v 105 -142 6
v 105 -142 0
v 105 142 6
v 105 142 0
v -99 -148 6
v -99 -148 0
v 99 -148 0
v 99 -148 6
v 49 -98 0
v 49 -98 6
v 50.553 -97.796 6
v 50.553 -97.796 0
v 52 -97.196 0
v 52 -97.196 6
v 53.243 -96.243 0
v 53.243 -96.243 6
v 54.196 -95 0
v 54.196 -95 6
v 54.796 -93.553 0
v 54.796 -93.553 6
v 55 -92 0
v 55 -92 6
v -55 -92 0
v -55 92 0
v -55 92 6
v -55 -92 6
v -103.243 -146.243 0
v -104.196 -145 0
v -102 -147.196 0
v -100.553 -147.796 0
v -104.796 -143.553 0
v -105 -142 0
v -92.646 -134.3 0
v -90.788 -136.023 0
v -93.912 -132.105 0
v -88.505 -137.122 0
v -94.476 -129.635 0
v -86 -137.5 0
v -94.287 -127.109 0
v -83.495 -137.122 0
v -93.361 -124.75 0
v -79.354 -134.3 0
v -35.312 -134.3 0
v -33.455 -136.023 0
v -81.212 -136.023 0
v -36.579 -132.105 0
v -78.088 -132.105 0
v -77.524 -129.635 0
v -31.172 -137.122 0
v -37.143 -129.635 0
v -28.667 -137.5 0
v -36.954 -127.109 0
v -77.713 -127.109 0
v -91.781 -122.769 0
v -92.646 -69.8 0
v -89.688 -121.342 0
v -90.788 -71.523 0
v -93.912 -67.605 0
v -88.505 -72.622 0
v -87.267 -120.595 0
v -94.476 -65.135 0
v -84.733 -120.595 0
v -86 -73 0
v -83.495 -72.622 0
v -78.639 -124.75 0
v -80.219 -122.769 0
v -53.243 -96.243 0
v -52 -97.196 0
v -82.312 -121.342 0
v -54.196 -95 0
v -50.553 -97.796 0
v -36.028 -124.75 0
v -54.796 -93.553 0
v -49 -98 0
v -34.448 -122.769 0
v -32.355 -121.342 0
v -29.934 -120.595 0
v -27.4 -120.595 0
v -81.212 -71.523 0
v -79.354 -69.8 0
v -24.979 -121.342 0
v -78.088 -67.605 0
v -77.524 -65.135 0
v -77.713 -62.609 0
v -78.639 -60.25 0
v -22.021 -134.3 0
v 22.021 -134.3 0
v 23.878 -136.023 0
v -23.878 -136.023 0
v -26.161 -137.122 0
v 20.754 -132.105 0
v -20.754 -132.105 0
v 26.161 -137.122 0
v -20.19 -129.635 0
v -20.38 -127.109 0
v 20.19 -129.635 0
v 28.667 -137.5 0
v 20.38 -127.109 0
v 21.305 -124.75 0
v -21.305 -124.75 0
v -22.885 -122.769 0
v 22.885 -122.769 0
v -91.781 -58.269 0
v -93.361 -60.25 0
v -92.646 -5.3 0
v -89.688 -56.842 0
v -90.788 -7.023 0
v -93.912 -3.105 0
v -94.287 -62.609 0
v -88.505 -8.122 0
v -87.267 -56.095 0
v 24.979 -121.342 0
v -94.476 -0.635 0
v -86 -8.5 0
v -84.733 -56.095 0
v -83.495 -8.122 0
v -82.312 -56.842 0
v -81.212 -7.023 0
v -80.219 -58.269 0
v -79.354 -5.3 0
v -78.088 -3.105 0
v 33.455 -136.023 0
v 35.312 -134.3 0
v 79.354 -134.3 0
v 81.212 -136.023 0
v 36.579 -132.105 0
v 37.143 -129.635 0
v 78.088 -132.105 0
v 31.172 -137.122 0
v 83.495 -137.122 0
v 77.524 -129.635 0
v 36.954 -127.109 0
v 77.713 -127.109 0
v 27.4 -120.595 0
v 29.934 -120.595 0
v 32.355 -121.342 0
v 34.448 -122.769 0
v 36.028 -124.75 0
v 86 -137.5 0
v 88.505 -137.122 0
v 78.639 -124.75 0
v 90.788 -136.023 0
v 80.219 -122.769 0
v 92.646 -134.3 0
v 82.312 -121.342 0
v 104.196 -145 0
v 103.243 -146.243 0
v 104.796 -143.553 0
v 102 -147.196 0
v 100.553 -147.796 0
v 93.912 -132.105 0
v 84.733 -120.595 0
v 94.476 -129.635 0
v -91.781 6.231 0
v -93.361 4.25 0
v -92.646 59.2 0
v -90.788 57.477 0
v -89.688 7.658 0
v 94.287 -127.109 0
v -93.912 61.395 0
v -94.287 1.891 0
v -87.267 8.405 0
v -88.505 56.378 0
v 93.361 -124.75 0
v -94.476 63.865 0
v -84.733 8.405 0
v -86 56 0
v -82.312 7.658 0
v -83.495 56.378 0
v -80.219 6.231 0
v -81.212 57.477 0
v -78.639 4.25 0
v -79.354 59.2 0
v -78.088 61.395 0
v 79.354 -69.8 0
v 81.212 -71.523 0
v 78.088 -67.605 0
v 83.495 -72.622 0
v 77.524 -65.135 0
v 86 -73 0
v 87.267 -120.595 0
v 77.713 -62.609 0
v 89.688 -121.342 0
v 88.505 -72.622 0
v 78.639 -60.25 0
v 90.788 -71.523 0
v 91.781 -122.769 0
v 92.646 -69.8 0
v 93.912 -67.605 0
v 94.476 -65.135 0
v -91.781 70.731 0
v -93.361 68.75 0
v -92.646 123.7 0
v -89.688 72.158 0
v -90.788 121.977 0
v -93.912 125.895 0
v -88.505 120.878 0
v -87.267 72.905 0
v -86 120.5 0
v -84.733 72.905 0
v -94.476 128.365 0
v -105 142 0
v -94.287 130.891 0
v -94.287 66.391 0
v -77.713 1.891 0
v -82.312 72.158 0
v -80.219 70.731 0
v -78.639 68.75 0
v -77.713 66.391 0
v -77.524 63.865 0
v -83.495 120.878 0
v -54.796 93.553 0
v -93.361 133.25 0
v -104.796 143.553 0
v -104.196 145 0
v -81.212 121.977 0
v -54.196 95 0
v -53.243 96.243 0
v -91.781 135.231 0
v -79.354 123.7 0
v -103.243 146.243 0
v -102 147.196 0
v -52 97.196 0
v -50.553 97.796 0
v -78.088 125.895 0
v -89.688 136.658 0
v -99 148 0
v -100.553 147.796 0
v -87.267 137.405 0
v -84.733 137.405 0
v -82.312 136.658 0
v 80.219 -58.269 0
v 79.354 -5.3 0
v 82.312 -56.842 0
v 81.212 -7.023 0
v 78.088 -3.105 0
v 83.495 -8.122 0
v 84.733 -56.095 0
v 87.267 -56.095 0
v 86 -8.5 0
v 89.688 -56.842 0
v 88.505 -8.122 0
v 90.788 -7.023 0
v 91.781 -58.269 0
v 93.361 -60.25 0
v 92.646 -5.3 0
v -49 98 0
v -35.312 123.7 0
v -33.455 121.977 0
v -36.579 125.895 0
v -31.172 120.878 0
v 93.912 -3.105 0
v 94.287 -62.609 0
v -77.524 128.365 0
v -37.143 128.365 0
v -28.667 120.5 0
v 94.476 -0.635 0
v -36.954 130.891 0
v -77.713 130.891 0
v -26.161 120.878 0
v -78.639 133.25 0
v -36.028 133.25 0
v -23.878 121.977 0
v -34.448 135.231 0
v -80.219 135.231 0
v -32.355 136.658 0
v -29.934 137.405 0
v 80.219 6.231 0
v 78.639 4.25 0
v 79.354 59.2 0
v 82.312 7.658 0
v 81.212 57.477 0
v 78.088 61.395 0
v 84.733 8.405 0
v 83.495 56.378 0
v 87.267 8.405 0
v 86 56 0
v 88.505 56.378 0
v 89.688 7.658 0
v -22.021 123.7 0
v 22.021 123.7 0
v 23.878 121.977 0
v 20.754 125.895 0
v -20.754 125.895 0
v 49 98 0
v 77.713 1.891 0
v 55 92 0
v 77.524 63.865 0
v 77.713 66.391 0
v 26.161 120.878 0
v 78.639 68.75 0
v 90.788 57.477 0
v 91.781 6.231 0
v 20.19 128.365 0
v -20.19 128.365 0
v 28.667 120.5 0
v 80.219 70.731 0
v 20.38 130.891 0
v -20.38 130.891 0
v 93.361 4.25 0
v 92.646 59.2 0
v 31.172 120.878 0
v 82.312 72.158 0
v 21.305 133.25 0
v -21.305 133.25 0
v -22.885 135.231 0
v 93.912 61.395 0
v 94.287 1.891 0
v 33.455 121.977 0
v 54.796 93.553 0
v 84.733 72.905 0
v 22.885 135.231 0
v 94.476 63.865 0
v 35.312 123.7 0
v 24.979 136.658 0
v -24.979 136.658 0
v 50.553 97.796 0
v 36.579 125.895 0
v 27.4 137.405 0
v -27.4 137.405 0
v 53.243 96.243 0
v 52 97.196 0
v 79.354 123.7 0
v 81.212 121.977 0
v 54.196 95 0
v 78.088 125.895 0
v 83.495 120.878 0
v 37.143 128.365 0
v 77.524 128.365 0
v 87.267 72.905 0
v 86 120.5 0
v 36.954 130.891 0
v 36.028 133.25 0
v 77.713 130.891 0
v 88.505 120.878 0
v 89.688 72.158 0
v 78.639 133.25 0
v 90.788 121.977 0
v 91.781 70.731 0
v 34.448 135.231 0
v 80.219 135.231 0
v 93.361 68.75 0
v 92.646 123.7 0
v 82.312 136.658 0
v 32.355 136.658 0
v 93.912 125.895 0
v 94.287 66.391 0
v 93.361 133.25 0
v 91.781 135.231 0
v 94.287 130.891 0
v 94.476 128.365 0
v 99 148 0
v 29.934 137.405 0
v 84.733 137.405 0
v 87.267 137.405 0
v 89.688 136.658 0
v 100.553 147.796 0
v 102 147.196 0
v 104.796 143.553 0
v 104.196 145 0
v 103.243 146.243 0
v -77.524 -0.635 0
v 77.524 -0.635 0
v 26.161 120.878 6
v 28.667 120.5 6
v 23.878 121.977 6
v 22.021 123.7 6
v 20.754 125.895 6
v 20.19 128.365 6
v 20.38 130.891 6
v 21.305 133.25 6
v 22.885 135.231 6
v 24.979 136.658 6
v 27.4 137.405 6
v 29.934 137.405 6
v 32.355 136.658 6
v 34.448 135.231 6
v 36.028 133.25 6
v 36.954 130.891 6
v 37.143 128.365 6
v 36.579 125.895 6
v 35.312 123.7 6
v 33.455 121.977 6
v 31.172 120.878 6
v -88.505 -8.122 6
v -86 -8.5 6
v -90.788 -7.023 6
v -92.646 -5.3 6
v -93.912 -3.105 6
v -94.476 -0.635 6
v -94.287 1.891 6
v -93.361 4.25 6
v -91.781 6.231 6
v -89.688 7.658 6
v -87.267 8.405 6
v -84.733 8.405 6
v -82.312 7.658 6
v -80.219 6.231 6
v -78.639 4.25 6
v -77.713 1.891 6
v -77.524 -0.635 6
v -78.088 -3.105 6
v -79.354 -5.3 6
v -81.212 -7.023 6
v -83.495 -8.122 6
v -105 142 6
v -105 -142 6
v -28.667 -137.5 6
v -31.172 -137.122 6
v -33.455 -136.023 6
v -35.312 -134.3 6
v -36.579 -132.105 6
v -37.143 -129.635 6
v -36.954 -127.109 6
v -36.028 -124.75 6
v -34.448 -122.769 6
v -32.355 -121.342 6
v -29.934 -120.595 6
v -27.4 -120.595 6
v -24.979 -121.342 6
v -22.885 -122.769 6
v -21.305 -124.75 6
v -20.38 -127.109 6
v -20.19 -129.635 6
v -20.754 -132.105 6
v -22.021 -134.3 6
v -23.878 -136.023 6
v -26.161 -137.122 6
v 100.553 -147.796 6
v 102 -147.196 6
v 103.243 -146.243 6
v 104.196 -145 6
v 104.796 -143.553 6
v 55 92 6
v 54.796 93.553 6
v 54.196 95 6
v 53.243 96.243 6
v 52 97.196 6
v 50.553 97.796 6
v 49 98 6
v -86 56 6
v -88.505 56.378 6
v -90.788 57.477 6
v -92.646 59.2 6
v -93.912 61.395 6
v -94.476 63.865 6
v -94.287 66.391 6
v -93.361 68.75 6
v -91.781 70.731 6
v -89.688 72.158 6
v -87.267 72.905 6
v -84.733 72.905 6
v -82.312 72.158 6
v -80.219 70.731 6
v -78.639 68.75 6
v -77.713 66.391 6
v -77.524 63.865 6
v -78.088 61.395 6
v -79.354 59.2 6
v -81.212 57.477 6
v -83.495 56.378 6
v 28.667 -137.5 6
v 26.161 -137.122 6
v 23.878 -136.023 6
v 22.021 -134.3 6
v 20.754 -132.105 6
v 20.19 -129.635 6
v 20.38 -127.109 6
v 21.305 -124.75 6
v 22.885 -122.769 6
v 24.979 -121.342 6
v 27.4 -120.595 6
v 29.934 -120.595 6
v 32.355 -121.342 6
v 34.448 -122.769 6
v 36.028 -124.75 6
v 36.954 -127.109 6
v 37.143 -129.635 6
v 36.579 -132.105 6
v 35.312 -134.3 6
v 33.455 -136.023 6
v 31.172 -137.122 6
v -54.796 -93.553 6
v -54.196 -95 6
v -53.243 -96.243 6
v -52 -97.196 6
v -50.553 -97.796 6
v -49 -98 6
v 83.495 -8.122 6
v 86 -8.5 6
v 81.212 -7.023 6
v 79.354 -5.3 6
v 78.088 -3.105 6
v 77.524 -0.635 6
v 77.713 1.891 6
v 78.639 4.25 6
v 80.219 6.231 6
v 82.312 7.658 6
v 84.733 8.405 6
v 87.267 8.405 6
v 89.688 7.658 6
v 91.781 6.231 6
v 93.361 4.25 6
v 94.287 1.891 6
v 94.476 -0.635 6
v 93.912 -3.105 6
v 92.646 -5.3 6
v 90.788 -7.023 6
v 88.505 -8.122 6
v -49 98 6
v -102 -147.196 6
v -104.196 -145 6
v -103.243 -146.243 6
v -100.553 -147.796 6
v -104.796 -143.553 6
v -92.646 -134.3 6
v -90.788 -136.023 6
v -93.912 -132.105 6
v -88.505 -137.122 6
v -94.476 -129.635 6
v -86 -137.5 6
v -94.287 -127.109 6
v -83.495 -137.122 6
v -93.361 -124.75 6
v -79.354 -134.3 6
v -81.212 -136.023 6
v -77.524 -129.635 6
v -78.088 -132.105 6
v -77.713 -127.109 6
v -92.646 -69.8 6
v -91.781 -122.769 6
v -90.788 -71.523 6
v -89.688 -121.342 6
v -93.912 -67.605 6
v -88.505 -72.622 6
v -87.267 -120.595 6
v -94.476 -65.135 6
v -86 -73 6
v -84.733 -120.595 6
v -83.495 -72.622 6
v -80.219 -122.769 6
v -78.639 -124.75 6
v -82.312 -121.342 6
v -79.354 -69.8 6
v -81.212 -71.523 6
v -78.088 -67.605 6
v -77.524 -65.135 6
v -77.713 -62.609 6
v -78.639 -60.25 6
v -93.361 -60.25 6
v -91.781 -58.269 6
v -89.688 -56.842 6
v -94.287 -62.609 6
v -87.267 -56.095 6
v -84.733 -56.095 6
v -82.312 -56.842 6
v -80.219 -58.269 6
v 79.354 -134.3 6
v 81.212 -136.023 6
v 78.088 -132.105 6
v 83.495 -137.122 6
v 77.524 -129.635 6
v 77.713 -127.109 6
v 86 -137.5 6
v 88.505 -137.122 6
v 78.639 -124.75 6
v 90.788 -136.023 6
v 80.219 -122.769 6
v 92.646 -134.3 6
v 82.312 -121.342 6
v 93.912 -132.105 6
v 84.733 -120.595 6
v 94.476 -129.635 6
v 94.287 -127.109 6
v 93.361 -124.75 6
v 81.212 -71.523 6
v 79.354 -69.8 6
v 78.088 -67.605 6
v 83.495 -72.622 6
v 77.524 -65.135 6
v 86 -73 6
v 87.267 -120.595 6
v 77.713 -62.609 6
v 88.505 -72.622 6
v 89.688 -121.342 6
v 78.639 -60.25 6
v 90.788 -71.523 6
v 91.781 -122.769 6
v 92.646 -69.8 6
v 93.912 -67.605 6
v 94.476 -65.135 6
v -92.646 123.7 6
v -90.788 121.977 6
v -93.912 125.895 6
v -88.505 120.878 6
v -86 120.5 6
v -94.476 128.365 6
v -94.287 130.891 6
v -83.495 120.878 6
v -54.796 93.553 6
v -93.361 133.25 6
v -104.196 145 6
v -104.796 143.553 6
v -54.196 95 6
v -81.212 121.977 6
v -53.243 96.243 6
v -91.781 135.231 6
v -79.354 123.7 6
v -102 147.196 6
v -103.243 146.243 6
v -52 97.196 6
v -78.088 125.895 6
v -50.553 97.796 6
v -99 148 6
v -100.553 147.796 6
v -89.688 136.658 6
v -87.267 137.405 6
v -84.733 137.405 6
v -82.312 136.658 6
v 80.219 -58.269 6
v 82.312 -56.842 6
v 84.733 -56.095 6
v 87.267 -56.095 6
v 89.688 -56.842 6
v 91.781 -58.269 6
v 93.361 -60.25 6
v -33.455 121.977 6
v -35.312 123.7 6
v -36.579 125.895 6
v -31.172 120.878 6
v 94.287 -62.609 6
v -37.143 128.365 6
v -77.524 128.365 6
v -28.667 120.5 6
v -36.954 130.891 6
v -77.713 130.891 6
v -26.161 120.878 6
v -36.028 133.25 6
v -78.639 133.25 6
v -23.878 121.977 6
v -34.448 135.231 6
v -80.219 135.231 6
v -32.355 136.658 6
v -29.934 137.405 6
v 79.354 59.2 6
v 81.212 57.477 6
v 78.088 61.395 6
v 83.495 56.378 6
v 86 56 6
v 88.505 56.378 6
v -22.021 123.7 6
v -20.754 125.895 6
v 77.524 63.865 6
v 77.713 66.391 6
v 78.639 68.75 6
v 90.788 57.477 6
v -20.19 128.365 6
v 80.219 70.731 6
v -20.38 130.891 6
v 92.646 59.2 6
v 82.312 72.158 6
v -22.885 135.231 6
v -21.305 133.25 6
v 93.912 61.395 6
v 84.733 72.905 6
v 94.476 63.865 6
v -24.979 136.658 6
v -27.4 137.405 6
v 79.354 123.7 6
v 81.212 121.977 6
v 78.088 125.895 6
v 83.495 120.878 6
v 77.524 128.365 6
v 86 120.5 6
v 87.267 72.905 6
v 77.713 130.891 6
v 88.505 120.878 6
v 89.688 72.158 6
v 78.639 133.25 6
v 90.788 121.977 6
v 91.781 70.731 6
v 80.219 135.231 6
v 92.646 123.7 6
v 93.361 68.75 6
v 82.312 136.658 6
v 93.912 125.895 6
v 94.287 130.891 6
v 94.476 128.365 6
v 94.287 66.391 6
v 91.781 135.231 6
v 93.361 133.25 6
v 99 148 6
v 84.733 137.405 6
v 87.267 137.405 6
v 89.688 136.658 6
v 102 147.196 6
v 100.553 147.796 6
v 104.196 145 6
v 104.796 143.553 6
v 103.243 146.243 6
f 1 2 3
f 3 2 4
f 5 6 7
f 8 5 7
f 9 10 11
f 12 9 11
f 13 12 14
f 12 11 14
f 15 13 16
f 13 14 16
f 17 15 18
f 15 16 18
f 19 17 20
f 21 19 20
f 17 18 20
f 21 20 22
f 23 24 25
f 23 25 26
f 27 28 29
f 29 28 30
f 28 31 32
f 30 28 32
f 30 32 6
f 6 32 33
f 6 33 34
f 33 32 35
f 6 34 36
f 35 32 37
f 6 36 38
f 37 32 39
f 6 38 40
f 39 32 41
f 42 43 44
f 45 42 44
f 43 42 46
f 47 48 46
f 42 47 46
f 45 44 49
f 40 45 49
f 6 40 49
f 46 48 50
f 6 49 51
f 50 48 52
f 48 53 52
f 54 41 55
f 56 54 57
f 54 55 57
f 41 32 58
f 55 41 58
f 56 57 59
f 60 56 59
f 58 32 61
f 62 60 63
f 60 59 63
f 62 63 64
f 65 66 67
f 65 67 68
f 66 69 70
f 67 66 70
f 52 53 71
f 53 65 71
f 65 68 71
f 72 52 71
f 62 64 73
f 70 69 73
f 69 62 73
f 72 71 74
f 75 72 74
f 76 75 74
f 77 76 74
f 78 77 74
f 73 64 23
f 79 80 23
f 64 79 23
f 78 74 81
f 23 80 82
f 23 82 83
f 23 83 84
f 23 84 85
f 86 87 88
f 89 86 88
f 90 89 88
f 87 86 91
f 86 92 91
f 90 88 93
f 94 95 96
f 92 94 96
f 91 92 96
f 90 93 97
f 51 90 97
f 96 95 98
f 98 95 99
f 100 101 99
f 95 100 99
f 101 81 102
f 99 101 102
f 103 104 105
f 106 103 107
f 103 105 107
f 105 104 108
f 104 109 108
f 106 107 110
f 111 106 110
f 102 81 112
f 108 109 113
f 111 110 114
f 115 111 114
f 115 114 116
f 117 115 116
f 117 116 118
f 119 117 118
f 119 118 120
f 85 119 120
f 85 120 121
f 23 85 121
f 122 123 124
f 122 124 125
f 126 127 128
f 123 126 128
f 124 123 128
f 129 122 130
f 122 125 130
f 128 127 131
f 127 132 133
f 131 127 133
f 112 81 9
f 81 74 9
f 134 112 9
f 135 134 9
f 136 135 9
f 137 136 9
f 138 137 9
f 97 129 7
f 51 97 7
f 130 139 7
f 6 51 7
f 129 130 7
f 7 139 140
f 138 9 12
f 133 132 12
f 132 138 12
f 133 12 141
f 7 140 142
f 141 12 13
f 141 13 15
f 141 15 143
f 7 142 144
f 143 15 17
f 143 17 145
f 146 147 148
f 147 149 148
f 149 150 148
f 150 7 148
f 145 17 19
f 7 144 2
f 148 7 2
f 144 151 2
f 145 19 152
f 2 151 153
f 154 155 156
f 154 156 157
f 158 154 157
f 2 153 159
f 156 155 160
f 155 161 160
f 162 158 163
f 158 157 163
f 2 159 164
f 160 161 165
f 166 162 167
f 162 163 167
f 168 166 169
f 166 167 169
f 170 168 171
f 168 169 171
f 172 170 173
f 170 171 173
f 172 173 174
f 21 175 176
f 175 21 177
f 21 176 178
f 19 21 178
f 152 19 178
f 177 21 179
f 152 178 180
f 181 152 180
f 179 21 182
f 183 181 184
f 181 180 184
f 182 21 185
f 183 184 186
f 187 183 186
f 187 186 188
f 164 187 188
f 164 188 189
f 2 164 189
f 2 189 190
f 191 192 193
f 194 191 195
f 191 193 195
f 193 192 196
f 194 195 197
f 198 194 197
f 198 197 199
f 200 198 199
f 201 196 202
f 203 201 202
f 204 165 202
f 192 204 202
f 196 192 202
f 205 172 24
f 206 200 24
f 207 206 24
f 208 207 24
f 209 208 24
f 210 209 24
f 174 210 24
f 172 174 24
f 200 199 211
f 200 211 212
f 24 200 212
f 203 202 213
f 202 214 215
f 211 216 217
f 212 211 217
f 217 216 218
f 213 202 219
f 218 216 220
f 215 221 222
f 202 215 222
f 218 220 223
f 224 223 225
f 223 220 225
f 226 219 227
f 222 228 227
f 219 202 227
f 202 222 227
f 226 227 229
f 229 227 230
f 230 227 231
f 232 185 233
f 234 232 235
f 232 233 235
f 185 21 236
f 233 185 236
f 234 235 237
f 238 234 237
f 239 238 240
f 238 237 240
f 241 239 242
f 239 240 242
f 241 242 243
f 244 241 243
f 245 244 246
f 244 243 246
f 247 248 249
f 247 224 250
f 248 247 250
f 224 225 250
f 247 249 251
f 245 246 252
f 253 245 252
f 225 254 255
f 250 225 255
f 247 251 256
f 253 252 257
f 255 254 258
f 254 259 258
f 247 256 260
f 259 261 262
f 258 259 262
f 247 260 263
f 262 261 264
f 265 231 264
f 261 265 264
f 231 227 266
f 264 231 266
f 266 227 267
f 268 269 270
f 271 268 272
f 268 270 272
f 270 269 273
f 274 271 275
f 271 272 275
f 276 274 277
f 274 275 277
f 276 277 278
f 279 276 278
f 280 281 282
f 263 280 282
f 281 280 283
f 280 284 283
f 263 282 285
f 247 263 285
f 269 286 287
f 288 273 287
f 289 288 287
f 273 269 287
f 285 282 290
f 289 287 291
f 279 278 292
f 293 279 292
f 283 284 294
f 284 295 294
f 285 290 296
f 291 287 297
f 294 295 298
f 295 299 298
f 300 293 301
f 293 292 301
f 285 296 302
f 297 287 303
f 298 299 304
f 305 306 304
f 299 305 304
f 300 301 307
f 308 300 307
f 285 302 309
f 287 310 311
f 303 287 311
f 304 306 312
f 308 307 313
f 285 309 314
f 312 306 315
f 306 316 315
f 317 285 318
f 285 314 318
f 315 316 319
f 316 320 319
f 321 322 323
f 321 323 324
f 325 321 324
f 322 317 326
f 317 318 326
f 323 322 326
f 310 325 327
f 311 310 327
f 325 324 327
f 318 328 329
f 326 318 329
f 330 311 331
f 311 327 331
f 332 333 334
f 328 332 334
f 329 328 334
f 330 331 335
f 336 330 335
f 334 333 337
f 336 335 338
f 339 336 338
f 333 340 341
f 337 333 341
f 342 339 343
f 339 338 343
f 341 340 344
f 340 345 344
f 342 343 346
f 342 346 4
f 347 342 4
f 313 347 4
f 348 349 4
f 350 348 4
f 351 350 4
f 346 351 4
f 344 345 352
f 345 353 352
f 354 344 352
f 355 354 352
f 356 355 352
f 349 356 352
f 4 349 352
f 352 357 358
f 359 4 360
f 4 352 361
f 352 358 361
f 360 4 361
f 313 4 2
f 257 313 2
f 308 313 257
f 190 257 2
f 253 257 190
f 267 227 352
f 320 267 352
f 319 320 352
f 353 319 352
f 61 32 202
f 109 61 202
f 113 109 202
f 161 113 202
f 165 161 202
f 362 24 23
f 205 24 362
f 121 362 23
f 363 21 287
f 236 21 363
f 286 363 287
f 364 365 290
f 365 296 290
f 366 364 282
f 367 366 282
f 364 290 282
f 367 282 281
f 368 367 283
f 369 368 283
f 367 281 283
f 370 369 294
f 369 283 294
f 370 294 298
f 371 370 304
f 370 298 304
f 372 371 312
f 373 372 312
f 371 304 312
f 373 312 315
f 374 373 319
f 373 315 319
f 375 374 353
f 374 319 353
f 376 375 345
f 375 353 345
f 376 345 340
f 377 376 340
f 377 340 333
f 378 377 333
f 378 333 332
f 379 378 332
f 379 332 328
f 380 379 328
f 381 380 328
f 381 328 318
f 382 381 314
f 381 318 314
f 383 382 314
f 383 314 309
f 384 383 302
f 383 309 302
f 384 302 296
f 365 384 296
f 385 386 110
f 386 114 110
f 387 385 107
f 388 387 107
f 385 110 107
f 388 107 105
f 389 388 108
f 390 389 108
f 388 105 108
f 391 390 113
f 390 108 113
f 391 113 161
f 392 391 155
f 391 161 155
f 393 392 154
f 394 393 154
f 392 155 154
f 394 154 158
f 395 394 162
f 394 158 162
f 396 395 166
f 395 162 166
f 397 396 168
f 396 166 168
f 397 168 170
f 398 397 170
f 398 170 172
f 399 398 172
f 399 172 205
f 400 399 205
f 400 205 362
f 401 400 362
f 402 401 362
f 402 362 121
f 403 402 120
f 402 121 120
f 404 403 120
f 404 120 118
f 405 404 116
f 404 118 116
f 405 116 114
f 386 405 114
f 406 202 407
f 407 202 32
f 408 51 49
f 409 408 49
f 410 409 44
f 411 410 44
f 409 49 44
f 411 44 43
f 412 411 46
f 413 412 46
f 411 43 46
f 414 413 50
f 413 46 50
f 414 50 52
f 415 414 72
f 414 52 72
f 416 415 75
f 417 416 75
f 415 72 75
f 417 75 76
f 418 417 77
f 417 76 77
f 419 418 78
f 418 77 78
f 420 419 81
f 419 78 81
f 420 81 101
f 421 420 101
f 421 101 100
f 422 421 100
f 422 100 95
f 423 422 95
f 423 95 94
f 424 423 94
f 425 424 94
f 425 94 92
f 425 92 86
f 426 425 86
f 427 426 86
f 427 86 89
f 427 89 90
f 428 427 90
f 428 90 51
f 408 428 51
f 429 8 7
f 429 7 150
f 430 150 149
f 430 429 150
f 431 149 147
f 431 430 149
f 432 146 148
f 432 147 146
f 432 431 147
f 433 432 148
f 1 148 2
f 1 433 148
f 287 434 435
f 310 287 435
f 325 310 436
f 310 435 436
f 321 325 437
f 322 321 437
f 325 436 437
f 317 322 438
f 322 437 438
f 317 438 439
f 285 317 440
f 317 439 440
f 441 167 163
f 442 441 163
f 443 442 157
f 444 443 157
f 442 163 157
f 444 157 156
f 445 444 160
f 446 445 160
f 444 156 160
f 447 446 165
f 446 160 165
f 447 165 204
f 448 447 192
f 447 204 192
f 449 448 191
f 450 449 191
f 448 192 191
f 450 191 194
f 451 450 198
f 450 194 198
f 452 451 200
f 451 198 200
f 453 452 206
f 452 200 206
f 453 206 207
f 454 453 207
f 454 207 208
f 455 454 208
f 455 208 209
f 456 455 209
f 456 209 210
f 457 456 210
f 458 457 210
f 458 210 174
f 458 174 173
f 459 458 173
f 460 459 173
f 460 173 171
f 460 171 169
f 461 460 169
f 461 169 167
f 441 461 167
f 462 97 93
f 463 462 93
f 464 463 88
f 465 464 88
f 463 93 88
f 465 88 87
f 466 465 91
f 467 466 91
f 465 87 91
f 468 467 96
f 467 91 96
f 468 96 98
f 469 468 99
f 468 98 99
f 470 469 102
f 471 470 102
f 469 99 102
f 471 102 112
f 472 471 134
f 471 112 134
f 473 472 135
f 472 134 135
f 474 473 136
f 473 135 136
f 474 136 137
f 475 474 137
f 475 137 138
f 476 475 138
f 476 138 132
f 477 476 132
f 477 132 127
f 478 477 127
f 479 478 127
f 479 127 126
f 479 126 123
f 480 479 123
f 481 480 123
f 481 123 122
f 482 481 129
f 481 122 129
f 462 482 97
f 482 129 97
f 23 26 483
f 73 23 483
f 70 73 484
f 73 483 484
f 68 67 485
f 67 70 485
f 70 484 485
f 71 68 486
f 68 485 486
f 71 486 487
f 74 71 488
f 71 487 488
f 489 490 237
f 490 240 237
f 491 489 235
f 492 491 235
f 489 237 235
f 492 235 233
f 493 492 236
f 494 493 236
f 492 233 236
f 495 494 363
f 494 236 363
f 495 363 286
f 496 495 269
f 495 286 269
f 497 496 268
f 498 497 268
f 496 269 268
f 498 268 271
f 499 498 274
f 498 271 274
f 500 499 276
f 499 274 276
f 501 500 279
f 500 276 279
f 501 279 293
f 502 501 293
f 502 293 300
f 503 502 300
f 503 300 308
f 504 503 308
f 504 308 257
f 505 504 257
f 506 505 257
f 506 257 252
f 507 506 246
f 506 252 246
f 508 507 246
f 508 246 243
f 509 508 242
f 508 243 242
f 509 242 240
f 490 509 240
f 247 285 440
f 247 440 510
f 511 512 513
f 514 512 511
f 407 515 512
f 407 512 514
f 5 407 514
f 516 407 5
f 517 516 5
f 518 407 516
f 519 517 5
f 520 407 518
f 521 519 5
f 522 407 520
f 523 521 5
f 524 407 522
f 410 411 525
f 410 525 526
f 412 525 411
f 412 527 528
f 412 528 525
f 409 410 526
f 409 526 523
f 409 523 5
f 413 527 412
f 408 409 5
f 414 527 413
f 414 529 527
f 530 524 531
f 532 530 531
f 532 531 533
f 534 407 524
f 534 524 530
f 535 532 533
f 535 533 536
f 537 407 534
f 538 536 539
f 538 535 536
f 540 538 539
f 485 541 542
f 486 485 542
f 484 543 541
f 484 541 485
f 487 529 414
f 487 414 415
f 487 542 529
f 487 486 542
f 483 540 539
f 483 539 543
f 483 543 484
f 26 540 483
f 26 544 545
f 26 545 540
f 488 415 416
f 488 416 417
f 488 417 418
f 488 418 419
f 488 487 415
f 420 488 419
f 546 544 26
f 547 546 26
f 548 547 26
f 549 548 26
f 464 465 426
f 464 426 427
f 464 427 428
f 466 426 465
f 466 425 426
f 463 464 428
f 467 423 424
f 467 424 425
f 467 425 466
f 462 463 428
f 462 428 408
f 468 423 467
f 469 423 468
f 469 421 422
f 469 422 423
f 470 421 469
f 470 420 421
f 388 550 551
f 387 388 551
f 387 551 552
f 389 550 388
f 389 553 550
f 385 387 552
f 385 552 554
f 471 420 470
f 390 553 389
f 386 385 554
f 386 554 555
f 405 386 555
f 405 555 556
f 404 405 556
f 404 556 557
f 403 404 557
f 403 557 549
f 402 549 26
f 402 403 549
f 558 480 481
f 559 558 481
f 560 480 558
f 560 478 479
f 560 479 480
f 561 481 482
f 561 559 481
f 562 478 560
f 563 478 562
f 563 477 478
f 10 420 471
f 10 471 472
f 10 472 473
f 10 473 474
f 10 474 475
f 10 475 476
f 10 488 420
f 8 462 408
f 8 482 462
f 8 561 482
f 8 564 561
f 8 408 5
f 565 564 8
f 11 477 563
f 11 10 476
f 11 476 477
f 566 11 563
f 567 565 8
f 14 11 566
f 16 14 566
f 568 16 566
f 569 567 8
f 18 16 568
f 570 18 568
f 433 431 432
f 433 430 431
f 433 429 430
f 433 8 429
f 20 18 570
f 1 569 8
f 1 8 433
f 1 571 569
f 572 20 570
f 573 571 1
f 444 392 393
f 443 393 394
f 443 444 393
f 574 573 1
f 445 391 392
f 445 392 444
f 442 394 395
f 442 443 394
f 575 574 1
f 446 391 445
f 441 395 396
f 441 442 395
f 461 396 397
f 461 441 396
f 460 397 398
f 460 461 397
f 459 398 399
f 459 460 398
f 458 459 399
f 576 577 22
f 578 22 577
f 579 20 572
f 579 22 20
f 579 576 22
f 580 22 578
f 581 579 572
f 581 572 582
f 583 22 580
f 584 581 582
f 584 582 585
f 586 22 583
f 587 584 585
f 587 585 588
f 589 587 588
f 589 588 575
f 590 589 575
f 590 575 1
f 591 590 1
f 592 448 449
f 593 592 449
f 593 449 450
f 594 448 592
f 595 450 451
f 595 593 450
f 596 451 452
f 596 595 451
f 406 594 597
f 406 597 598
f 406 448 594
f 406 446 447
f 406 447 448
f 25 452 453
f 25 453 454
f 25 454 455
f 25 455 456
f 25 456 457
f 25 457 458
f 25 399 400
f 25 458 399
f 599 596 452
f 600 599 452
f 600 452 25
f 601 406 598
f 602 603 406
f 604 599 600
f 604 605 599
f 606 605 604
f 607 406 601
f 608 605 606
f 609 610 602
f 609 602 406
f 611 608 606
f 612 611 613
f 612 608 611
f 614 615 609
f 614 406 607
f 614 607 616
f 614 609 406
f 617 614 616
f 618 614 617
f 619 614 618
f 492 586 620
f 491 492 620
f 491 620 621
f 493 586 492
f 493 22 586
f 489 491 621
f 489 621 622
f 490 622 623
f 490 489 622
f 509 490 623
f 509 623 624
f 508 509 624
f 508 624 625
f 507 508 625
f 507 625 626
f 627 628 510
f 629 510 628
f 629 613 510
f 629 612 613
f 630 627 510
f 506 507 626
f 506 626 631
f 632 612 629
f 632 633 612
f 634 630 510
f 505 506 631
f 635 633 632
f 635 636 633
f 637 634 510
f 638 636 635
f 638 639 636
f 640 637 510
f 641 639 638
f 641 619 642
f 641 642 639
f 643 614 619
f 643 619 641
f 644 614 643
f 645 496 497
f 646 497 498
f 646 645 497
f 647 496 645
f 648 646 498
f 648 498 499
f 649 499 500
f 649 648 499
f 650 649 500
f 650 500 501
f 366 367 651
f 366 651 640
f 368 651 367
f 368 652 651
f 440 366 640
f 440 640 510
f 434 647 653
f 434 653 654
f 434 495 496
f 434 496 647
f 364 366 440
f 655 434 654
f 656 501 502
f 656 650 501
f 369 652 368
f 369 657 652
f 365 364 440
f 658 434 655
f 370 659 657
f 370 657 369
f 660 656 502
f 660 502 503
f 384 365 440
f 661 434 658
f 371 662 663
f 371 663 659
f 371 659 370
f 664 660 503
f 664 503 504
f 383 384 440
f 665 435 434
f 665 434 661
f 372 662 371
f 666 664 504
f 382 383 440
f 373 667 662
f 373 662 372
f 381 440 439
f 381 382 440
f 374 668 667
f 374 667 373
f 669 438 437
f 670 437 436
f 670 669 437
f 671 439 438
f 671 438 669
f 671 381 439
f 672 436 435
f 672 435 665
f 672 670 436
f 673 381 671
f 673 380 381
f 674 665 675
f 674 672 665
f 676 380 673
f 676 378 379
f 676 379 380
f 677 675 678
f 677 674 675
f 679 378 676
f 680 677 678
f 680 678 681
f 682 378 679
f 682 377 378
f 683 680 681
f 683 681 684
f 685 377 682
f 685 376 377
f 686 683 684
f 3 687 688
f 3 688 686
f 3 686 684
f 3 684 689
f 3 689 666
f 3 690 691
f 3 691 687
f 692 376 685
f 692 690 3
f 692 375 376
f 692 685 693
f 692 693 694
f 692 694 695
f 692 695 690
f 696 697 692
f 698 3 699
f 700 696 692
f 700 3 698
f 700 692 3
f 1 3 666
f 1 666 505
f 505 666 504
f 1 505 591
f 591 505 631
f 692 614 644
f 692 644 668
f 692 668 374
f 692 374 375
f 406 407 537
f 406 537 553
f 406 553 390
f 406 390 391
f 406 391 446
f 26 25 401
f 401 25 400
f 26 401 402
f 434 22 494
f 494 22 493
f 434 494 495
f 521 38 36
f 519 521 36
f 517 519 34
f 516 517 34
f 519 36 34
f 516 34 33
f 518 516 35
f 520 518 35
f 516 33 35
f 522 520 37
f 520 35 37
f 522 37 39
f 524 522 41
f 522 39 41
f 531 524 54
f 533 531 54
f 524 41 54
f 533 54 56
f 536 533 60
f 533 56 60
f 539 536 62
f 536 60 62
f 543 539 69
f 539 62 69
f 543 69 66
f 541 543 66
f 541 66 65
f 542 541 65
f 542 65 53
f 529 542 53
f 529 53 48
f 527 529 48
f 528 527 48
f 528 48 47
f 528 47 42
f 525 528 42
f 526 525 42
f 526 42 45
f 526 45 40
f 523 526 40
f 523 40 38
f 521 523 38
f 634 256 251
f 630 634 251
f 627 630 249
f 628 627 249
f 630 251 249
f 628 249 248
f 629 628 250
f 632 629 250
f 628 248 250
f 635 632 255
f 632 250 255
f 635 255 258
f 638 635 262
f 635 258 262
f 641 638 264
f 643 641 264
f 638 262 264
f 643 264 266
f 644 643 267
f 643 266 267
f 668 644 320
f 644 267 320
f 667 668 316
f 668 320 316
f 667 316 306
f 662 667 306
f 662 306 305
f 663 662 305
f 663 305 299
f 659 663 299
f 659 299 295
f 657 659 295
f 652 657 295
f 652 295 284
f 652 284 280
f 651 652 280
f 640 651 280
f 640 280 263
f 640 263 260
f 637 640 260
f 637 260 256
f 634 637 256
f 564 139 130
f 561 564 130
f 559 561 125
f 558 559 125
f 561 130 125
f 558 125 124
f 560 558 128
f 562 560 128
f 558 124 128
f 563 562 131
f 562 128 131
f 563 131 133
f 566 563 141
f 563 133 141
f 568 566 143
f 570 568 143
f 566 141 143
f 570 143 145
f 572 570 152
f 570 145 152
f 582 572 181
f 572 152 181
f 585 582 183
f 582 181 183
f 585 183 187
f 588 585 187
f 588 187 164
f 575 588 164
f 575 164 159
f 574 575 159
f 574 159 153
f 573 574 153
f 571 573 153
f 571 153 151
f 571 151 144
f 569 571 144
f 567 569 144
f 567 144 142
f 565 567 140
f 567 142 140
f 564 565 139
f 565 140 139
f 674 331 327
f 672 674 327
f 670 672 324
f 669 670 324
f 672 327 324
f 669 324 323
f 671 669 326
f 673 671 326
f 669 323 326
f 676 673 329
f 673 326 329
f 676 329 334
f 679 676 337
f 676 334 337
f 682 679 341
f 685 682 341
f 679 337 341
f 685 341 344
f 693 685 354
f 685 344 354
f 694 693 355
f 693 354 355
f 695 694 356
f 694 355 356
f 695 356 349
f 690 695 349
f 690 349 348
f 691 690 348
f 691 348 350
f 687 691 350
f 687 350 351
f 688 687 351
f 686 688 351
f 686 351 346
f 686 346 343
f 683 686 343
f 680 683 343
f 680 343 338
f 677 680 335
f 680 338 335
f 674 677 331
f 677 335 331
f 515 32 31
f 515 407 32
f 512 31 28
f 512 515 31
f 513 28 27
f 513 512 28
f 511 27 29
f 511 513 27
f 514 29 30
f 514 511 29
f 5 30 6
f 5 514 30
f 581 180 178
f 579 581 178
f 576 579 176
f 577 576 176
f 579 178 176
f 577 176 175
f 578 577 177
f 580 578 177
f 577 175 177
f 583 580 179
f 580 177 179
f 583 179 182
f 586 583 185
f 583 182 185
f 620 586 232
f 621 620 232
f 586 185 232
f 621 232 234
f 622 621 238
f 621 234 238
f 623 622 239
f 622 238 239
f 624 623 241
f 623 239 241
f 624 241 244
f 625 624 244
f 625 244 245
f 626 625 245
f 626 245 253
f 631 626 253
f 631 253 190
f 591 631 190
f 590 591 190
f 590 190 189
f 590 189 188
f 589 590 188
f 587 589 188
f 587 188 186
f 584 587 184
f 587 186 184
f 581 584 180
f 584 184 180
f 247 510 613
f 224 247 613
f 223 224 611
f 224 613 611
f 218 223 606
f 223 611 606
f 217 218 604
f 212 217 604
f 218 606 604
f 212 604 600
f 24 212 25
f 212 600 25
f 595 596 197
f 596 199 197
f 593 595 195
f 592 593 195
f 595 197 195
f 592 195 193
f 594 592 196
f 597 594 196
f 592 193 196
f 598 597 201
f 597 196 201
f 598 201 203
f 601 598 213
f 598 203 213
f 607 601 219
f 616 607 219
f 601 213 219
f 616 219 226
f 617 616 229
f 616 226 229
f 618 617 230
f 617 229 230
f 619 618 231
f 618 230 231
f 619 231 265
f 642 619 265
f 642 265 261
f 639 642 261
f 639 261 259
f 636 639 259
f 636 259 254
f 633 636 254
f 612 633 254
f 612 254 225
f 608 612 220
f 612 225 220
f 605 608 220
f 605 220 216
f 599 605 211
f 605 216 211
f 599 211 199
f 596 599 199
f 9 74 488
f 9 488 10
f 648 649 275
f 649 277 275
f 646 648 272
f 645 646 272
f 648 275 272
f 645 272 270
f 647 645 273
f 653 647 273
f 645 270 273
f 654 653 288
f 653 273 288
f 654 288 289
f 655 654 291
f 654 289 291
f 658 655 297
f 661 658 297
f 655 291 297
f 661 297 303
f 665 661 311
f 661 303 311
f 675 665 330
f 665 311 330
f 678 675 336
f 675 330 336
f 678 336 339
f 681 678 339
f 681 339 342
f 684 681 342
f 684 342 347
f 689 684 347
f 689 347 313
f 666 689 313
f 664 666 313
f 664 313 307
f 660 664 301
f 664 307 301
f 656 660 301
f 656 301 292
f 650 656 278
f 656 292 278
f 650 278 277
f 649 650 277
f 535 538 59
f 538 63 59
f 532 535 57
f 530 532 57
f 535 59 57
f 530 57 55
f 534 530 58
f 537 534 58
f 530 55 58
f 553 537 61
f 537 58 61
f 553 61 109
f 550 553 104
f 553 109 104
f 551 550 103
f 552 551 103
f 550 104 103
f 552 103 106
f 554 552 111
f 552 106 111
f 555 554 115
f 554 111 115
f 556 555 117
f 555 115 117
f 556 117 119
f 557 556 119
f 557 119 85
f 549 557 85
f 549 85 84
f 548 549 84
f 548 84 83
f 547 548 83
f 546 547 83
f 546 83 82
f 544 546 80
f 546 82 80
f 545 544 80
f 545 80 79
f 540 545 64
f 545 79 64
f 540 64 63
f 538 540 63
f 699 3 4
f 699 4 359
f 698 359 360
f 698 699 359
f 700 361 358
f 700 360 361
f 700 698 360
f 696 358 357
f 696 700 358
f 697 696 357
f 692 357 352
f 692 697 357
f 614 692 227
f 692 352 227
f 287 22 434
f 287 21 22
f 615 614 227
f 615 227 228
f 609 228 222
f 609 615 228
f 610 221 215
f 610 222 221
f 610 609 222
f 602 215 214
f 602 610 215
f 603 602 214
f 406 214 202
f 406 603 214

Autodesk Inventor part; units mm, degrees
ref_plane "YZ Plane" through (0, 0, 0) normal (1, 0, 0) x (0, 1, 0)
ref_plane "XZ Plane" through (0, 0, 0) normal (0, 1, 0) x (-1, 0, 0)
ref_plane "XY Plane" through (0, 0, 0) normal (0, 0, 1) x (1, 0, 0)
sketch "Sketch2" plane through (0, 0, 0) normal (0, 0, 1) x (1, 0, 0)
  line L0 (-55, -98) -> (55, -98)
  line L1 (55, -98) -> (55, 98)
  line L2 (55, 98) -> (-55, 98)
  line L3 (-55, 98) -> (-55, -98)
  line L4 (-55, -98) -> (55, 98) construction
  line L5 (55, -98) -> (-55, 98) construction
  line L6 (-105, -148) -> (105, -148)
  line L7 (105, -148) -> (105, 148)
  line L8 (105, 148) -> (-105, 148)
  line L9 (-105, 148) -> (-105, -148)
  point P0 (0, 0)
  dimension "d29" = 110
  dimension "d30" = 196
  dimension "d31" = 50
extrude "Plate2" add sketch "Sketch2" along normal blind 6
sketch "Sketch5" plane through (0, 0, 6) normal (0, 0, 1) x (1, 0, 0)
  line L0 (55, 98) -> (55, -98) construction
  line L1 (55, -98) -> (-55, -98) construction
  line L2 (-55, -98) -> (-55, 98) construction
  line L3 (-55, 98) -> (55, 98) construction
  line L4 (105, -148) -> (-105, -148) construction
  line L5 (105, 148) -> (105, -148) construction
  line L6 (-105, 148) -> (105, 148) construction
  line L7 (-105, -148) -> (-105, 148) construction
  line L8 (-86, 129) -> (86, 129) construction
  line L9 (86, 129) -> (86, -129) construction
  line L10 (86, -129) -> (-86, -129) construction
  line L11 (-86, -129) -> (-86, 129) construction
  line L12 (-55, 0) -> (55, 0) construction
  line L13 (0, 98) -> (0, -98)
  point P0 (0, 0)
  point P1 (0, -129)
  point P2 (-86, 64.5)
  point P3 (-86, 0)
  point P4 (-86, -64.5)
  point P5 (-28.6667, -129)
  point P6 (28.6667, -129)
  point P7 (86, -64.5)
  point P8 (86, 0)
  point P9 (86, 64.5)
  point P10 (28.6667, 129)
  point P11 (-28.6667, 129)
  dimension "d34" = 19
  dimension "d49" = 64.5
  dimension "d50" = 64.5
  dimension "d51" = 57.3333
  dimension "d52" = 57.3333
  dimension "d53" = 57.3333
fillet "Corner Round1" radius 6 8 edges at (-105, -148, 3) (-105, 148, 3) (105, 148, 3) (105, -148, 3) (55, -98, 3) (-55, -98, 3) (-55, 98, 3) (55, 98, 3)
hole "Hole1" at (-86, 129, 6) at (-86, 64.5, 6) at (-86, 0, 6) at (-86, -64.5, 6) at (-86, -129, 6) at (-28.6667, -129, 6) at (28.6667, -129, 6) at (86, -129, 6) at (86, -64.5, 6) at (86, 0, 6) at (86, 64.5, 6) at (86, 129, 6) at (28.6667, 129, 6) at (-28.6667, 129, 6) direction (0, 0, -1) diameter 17 end through all
equation "\"d49\" = d50"
equation "\"d51\" = d53"
equation "\"d52\" = d53"
equation "\"d29\" = ChargingHatch_hight - 2 * Thickness"
equation "\"d30\" = ChargingHatch_width - 2 * Thickness"
equation "\"d59\" = Thickness"
equation "\"d14\" = Thickness"
equation "\"BendReliefWidth\" = Thickness"
equation "\"BendReliefDepth\" = 0.5 * Thickness"
equation "\"CornerReliefSize\" = 4 * Thickness"
equation "\"MinimumRemnant\" = 2 * Thickness"
equation "\"TransitionRadius\" = BendRadius"
equation "\"JacobiRadiusSize\" = BendRadius"
equation "\"GapSize\" = Thickness"
equation "\"ChargingHatch_hight\" = 122"
equation "\"Thickness\" = 6"
equation "\"ChargingHatch_width\" = 208"
equation "\"BendRadius\" = 6"
properties part number "PRS 9606 charging flange round_D1200" material "Steel"
